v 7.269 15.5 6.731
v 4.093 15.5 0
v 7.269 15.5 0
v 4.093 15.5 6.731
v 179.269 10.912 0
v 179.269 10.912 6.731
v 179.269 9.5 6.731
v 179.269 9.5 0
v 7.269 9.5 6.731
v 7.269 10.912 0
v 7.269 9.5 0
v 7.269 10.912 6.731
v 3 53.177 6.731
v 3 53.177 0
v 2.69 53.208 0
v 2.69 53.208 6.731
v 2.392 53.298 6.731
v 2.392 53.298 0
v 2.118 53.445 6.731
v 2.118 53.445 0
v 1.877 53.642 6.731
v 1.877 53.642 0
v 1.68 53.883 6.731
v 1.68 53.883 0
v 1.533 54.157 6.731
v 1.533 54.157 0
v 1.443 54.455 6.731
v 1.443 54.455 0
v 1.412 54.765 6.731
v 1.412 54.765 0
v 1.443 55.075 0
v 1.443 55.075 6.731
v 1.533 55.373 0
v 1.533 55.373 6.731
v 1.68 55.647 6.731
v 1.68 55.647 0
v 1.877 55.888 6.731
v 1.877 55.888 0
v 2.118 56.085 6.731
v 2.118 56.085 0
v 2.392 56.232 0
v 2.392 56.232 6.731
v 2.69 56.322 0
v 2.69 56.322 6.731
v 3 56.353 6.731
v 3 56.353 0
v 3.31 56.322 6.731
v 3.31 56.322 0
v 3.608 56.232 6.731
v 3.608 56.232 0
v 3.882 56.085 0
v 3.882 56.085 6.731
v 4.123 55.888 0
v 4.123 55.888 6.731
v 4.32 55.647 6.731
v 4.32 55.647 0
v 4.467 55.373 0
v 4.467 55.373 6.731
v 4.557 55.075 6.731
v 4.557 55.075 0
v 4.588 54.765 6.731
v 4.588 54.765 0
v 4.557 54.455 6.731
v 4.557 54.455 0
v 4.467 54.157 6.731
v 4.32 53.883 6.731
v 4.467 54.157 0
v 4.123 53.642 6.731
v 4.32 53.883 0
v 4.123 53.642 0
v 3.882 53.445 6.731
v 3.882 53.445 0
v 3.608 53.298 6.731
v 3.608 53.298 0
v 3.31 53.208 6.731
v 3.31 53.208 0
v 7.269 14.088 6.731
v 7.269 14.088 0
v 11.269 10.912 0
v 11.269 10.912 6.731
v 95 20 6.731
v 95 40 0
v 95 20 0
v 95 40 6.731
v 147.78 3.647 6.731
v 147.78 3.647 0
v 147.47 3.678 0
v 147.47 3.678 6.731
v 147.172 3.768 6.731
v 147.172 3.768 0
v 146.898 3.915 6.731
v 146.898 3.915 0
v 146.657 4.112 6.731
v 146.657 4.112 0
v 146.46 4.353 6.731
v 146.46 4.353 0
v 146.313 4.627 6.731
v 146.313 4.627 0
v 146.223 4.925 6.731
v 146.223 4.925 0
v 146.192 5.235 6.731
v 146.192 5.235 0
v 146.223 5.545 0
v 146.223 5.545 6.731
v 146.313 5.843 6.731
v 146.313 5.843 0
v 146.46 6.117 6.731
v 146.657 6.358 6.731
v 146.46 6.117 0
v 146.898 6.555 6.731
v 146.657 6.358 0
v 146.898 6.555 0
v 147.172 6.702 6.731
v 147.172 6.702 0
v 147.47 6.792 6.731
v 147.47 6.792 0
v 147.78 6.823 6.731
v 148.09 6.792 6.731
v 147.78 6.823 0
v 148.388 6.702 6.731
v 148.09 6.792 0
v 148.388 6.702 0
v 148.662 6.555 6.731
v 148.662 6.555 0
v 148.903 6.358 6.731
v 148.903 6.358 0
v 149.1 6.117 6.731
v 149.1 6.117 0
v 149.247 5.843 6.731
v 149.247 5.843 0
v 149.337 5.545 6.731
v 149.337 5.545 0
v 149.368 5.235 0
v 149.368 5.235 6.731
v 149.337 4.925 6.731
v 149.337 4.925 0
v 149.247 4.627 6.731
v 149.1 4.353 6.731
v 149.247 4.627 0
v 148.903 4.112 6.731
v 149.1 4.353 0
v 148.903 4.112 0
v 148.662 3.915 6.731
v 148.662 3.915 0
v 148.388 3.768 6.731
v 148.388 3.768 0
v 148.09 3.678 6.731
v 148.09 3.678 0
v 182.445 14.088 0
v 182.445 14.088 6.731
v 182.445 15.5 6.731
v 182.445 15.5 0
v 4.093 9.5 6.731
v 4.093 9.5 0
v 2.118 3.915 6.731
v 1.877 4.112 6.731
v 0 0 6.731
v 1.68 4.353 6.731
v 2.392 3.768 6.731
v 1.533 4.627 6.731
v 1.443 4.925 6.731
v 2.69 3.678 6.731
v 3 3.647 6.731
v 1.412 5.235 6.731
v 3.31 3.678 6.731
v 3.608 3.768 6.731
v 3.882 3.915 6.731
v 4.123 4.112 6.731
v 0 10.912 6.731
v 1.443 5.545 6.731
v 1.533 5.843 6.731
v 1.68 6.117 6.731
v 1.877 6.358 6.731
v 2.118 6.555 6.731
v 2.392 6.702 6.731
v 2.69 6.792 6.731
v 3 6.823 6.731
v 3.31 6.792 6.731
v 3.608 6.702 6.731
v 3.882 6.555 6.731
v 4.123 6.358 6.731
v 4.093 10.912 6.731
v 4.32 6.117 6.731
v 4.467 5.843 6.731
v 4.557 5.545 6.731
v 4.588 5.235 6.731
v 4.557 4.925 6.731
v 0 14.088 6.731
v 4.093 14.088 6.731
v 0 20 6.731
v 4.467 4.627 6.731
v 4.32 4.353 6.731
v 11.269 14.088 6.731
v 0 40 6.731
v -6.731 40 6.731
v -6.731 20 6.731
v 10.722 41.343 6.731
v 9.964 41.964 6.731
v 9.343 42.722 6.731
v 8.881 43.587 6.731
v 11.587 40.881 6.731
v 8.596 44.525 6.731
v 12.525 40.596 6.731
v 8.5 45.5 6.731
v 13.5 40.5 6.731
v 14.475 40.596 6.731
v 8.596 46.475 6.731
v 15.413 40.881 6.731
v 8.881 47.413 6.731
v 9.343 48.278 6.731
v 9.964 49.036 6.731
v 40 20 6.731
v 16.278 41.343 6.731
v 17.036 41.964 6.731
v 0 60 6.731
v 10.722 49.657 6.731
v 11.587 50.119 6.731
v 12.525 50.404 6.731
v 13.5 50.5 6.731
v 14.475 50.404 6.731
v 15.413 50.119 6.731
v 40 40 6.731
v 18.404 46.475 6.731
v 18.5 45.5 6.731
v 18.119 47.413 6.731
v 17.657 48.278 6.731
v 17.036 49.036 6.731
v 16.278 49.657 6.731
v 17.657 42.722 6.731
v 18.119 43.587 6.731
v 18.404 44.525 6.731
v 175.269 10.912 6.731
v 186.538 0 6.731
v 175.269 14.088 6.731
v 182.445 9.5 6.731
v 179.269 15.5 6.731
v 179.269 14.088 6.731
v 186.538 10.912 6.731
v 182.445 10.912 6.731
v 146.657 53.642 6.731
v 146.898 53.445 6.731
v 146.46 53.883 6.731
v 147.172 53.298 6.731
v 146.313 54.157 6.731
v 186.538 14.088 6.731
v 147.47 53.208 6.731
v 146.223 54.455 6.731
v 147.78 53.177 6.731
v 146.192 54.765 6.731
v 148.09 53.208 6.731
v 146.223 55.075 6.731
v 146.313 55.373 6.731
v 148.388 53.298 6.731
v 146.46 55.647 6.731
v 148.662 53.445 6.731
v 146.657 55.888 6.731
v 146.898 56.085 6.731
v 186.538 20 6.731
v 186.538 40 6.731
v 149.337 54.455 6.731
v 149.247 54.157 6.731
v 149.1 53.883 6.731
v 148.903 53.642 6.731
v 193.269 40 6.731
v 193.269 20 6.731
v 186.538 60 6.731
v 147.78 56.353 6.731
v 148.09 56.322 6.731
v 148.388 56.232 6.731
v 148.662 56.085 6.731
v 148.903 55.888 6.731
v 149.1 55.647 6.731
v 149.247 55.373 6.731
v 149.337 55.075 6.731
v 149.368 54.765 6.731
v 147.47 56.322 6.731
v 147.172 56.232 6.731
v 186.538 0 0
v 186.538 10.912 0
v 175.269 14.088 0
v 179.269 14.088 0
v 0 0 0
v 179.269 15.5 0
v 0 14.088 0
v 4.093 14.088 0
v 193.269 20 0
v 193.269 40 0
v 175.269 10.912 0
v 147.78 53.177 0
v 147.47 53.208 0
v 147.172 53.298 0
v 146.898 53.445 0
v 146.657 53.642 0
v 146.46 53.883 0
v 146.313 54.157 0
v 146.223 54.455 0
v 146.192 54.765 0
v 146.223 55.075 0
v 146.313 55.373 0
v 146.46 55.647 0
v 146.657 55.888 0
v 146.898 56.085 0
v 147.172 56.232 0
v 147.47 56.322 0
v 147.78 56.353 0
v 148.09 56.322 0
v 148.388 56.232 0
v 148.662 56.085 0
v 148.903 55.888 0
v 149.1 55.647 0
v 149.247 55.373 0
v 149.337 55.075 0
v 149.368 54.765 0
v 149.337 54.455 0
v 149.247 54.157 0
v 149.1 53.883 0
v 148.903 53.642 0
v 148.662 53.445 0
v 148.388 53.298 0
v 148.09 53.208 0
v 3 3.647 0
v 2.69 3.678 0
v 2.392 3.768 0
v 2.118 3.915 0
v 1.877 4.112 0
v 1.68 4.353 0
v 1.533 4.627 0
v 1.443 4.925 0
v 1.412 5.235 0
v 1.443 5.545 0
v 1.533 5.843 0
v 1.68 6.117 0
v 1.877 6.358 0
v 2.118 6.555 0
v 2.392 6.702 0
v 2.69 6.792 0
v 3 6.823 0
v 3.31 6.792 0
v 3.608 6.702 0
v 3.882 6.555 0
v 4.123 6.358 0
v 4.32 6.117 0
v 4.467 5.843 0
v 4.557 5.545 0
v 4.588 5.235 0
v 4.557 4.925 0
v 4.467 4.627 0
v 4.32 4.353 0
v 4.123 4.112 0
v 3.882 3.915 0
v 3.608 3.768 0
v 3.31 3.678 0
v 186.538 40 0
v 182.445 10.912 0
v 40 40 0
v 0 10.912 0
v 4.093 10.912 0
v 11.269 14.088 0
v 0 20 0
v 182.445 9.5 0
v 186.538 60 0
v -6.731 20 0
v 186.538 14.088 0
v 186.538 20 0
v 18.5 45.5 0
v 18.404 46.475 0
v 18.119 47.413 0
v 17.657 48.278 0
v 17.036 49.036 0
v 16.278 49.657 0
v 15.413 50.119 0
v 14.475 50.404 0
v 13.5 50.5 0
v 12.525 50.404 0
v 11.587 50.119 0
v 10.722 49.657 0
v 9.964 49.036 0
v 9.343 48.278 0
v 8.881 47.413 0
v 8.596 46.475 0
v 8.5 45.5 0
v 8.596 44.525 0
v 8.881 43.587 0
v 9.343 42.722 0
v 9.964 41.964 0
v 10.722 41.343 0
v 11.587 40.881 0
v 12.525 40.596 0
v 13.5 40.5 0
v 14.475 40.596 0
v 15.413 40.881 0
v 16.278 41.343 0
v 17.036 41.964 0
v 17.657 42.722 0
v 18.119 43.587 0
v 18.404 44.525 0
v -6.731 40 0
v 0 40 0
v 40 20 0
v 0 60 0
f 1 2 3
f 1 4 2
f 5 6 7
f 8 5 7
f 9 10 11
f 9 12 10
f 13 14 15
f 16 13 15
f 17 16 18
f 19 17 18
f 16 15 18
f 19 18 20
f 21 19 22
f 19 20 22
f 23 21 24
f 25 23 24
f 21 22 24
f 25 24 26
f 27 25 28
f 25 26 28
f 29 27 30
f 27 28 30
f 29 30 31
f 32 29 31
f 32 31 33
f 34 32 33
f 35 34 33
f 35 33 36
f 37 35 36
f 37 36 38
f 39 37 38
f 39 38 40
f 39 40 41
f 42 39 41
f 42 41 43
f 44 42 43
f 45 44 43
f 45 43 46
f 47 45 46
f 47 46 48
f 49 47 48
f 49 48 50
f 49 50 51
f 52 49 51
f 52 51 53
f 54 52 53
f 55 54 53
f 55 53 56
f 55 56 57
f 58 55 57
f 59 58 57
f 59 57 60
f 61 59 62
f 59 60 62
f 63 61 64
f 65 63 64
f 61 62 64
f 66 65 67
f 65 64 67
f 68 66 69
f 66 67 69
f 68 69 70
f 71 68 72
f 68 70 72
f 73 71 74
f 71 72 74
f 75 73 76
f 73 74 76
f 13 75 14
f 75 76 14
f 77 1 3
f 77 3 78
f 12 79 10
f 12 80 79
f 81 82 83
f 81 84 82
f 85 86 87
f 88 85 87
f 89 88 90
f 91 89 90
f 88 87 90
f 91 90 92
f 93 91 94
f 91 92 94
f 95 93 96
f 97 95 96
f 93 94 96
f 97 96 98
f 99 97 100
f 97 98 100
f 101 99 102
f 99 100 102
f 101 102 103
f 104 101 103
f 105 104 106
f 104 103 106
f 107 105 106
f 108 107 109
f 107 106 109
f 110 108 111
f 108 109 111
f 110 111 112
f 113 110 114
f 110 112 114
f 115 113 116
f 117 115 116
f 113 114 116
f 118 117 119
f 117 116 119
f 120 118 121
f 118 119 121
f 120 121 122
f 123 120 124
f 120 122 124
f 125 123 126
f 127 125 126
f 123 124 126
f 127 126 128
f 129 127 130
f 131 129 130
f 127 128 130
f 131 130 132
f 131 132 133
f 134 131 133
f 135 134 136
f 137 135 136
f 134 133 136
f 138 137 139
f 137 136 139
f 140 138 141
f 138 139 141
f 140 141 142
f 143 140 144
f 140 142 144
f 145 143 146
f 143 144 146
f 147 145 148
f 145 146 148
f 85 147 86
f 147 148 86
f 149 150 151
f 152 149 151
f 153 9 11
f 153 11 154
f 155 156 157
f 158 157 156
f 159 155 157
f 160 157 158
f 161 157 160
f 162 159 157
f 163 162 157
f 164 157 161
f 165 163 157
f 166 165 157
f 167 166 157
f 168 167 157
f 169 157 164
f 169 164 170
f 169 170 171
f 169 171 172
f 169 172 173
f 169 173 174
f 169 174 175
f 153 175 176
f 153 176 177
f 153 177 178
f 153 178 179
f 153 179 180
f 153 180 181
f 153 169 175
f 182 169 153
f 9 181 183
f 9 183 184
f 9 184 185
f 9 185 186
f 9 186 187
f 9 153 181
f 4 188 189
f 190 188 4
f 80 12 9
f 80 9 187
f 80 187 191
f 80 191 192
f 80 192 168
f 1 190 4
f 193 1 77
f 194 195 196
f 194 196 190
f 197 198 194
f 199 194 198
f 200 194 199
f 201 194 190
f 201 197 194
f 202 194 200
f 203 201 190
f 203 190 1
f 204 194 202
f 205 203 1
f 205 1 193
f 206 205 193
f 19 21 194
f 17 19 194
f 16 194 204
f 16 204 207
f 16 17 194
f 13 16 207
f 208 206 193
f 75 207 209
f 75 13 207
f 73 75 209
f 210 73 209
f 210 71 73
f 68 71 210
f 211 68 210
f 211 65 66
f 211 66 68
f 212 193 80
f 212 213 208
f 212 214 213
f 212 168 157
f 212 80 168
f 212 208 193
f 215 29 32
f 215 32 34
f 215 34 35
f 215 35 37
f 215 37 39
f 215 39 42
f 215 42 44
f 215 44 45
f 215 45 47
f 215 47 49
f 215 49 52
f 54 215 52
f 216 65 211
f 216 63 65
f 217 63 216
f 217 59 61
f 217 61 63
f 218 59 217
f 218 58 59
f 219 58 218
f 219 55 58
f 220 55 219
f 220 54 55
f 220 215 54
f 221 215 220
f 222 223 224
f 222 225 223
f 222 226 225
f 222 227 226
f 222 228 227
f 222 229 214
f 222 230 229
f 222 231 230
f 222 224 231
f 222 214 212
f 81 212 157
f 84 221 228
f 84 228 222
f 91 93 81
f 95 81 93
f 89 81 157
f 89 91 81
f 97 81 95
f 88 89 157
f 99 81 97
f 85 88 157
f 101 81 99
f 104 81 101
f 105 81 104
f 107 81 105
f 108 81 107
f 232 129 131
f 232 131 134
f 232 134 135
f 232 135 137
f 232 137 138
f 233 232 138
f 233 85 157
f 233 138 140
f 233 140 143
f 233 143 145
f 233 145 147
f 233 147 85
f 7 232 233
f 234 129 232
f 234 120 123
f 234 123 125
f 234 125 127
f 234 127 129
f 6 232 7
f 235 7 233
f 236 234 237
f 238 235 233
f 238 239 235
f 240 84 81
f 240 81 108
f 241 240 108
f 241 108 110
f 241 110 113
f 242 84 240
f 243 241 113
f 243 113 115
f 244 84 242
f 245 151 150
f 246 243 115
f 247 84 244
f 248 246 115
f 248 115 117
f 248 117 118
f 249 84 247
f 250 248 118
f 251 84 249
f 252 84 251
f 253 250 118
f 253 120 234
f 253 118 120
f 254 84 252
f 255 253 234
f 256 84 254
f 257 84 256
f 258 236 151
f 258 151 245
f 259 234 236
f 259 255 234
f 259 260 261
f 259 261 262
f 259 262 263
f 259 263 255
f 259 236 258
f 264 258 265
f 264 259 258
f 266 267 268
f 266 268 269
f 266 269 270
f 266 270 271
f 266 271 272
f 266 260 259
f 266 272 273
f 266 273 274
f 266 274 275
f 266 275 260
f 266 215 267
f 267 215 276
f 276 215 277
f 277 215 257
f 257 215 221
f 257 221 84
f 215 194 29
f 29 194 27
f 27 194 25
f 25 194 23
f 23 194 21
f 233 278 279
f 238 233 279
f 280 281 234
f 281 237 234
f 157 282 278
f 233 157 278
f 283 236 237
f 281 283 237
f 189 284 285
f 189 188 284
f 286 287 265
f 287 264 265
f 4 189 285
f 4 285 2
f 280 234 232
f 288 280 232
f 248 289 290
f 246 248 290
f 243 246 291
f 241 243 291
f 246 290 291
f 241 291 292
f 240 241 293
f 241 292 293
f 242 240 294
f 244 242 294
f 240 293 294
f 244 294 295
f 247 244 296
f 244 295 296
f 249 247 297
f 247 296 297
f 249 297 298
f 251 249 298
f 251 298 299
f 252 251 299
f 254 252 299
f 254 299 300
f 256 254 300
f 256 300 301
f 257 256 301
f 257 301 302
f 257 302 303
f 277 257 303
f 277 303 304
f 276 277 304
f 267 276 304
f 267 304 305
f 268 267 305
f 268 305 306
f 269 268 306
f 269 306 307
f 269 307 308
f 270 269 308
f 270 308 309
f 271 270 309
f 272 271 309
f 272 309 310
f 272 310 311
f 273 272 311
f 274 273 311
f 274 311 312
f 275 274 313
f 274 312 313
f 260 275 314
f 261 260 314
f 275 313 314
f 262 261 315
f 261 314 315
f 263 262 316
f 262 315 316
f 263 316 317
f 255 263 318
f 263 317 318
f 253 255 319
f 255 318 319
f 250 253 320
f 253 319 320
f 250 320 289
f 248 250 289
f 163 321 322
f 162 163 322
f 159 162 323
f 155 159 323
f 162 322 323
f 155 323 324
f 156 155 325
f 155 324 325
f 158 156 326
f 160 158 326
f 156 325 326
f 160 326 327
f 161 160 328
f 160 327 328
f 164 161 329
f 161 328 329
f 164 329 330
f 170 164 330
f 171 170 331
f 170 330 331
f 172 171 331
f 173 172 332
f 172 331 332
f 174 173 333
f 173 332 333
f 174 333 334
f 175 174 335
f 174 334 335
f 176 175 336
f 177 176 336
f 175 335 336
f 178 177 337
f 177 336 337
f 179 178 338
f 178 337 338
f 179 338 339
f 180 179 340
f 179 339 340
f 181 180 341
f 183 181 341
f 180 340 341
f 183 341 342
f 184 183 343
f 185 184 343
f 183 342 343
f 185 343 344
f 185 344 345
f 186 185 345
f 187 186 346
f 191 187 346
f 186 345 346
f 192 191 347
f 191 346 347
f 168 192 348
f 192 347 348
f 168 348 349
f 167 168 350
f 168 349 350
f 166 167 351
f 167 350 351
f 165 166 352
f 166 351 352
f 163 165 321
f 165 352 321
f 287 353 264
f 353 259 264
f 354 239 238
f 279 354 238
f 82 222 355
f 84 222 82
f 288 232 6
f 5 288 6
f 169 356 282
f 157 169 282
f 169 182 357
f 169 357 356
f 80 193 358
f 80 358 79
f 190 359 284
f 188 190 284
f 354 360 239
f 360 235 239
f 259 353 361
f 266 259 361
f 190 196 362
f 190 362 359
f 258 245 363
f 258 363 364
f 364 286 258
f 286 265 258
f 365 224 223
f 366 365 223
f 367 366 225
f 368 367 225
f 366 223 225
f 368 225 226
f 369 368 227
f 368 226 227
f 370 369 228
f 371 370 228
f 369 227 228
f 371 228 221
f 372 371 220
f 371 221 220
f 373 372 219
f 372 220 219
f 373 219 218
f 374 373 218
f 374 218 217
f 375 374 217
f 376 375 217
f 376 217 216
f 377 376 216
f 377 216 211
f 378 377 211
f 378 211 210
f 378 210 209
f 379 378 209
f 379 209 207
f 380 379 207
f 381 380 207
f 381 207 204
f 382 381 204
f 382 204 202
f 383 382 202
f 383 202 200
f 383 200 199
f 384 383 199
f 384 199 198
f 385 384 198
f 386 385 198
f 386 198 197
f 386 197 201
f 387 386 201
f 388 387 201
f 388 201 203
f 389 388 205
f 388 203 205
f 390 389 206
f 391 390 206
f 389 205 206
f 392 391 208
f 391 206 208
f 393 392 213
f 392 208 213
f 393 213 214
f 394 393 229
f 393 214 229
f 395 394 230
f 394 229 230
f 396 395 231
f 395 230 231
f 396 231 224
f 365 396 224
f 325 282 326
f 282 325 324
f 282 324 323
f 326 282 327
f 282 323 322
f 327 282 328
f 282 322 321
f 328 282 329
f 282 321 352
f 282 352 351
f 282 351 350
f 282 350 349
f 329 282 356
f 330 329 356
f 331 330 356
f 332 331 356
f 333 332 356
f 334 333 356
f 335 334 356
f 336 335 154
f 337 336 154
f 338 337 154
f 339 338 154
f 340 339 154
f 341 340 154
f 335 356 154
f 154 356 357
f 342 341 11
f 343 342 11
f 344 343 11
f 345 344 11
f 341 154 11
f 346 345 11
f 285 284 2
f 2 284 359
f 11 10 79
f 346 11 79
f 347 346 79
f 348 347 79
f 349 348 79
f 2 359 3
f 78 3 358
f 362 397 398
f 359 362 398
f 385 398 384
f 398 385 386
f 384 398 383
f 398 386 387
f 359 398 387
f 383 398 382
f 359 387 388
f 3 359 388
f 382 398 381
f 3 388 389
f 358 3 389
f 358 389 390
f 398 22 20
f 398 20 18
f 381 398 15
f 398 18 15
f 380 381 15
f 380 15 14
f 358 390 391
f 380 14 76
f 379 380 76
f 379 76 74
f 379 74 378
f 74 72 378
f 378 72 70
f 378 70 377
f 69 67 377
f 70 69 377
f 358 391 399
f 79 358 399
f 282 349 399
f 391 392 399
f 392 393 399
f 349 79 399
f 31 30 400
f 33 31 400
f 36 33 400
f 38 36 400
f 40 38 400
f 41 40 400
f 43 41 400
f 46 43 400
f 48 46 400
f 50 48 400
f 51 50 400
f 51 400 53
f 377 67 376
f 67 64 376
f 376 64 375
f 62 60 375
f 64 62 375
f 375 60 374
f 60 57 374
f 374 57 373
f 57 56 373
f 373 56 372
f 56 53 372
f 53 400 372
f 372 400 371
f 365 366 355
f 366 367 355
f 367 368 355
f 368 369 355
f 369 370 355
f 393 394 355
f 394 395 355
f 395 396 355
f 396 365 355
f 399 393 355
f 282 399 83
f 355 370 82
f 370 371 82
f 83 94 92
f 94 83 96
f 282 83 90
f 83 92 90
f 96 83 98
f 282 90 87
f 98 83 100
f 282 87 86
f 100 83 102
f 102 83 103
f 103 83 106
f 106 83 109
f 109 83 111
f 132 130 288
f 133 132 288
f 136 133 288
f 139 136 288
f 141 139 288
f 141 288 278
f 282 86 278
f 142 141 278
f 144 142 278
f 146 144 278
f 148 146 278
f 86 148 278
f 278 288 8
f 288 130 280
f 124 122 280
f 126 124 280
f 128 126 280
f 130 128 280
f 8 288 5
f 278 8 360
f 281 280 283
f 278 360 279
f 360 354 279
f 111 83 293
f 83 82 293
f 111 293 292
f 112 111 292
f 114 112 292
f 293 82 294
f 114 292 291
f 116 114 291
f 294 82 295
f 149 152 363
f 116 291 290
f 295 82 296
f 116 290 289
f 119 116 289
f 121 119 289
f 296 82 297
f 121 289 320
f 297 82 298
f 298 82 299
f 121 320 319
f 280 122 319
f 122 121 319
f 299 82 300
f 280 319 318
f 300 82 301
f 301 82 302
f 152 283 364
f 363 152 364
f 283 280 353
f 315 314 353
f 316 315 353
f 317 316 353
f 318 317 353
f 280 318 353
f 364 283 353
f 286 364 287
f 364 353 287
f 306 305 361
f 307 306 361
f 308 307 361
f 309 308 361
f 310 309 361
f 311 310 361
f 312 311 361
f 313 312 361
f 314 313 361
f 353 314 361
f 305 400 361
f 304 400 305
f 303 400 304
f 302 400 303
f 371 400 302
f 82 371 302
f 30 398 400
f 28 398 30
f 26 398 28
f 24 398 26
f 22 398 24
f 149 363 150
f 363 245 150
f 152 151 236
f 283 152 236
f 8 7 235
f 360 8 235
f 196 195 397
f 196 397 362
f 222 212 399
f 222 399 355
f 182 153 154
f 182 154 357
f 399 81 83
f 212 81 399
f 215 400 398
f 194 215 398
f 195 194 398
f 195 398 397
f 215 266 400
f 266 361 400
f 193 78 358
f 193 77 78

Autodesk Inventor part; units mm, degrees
ref_plane "YZ Plane" through (0, 0, 0) normal (1, 0, 0) x (0, 1, 0)
ref_plane "XZ Plane" through (0, 0, 0) normal (0, 1, 0) x (-1, 0, 0)
ref_plane "XY Plane" through (0, 0, 0) normal (0, 0, 1) x (1, 0, 0)
sketch "Sketch1" plane through (0, 0, 0) normal (0, 0, 1) x (1, 0, 0)
  line L0 (0, 0) -> (186.538, 0)
  line L1 (186.538, 0) -> (186.538, 60)
  line L2 (186.538, 60) -> (0, 60)
  line L3 (0, 60) -> (0, 0)
  dimension "d0" = 186.538
  dimension "d1" = 60
extrude "Extrusion1" add sketch "Sketch1" along normal blind 6.731
sketch "Sketch2" plane through (0, 0, 6.731) normal (0, 0, 1) x (1, 0, 0)
  line L0 (186.538, 0) -> (186.538, 60) projected
  line L1 (0, 60) -> (0, 0) projected
  line L2 (186.538, 40) -> (193.269, 40)
  line L3 (193.269, 40) -> (193.269, 20)
  line L4 (193.269, 20) -> (186.538, 20)
  line L5 (186.538, 20) -> (186.538, 40)
  line L6 (0, 40) -> (-6.731, 40)
  line L7 (-6.731, 40) -> (-6.731, 20)
  line L8 (-6.731, 20) -> (0, 20)
  line L9 (0, 20) -> (0, 40)
  point P0 (0, 30)
  point P1 (0, 30)
  dimension "d4" = 20
  dimension "d5" = 6.731
extrude "Tabs" add sketch "Sketch2" against normal blind 6.731
sketch "Sketch5" plane through (0, 0, 6.731) normal (0, 0, 1) x (1, 0, 0)
  line L0 (193.269, 40) -> (186.538, 40) projected
  line L1 (0, 40) -> (-6.731, 40) projected
  line L2 (-6.731, 40) -> (-6.731, 20) projected
  point P0 (-3.3655, 30)
  point P1 (189.9035, 30)
  point P2 (-6.731, 30)
  point P3 (-6.731, 30)
  point P4 (189.9035, 40)
  point P5 (-3.3655, 40)
hole "TabHole" [suppressed]
sketch "Sketch3" plane through (0, 0, 6.731) normal (0, 0, 1) x (1, 0, 0)
  line L0 (0, 60) -> (0, 40) projected
  line L1 (-6.731, 40) -> (-6.731, 20) projected
  line L2 (40, 40) -> (95, 40)
  line L3 (95, 40) -> (95, 20)
  line L4 (95, 20) -> (40, 20)
  line L5 (40, 20) -> (40, 40)
  point P0 (40, 30)
  point P1 (-6.731, 30)
  dimension "d8" = 55
  dimension "d9" = 20
  dimension "d10" = 40
extrude "RibbonHole" cut sketch "Sketch3" against normal up to next
sketch "Sketch4" plane through (0, 0, 6.731) normal (0, 0, 1) x (1, 0, 0)
  line L0 (40, 20) -> (40, 40) projected
  line L1 (0, 60) -> (0, 40) projected
  line L2 (0, 20) -> (0, 0) projected
  line L3 (3, 5.235) -> (3, 54.765) construction
  line L4 (3, 54.765) -> (147.78, 54.765) construction
  point P0 (3, 30)
  point P1 (40, 30)
  point P2 (147.78, 5.235)
  dimension "d13" = 144.78
  dimension "d14" = 49.53
  dimension "d16" = 3
hole "LCDMount" at (3, 54.765, 6.731) at (147.78, 54.765, 6.731) at (147.78, 5.235, 6.731) at (3, 5.235, 6.731) direction (0, 0, -1) diameter 3.176 end through all
sketch "Sketch6" plane through (0, 0, 6.731) normal (0, 0, 1) x (1, 0, 0)
  line L0 (186.538, 60) -> (0, 60) projected
  line L1 (0, 60) -> (0, 40) projected
  circle A0 centre (13.5, 45.5) radius 5
  dimension "d31" = 14.5
  dimension "d32" = 13.5
  dimension "d33" = 10
extrude "PotHole" cut sketch "Sketch6" against normal up to next
sketch "Sketch7" plane through (0, 0, 6.731) normal (0, 0, 1) x (1, 0, 0)
  line L0 (-6.731, 20) -> (0, 20) projected
  line L1 (0, 20) -> (0, 0) projected
  line L2 (0, 14.088) -> (4.093, 14.088)
  line L3 (4.093, 14.088) -> (4.093, 15.5)
  line L4 (4.093, 15.5) -> (7.269, 15.5)
  line L5 (7.269, 15.5) -> (7.269, 14.088)
  line L6 (7.269, 14.088) -> (11.269, 14.088)
  line L7 (11.269, 14.088) -> (11.269, 10.912)
  line L8 (11.269, 10.912) -> (7.269, 10.912)
  line L9 (7.269, 10.912) -> (7.269, 9.5)
  line L10 (7.269, 9.5) -> (4.093, 9.5)
  line L11 (4.093, 9.5) -> (4.093, 10.912)
  line L12 (4.093, 10.912) -> (0, 10.912)
  line L13 (186.538, 0) -> (186.538, 20) projected
  line L14 (-6.731, 40) -> (-6.731, 20) projected
  line L15 (186.538, 14.088) -> (182.445, 14.088)
  line L16 (182.445, 14.088) -> (182.445, 15.5)
  line L17 (182.445, 15.5) -> (179.269, 15.5)
  line L18 (179.269, 15.5) -> (179.269, 14.088)
  line L19 (179.269, 14.088) -> (175.269, 14.088)
  line L20 (175.269, 14.088) -> (175.269, 10.912)
  line L21 (175.269, 10.912) -> (179.269, 10.912)
  line L22 (179.269, 10.912) -> (179.269, 9.5)
  line L23 (179.269, 9.5) -> (182.445, 9.5)
  line L24 (182.445, 9.5) -> (182.445, 10.912)
  line L25 (182.445, 10.912) -> (186.538, 10.912)
  point P0 (11.269, 12.5)
  dimension "d36" = 3.176
  dimension "d38" = 11.269
  dimension "d39" = 4
  dimension "d40" = 6
  dimension "d43" = 7.5
extrude "Nut" cut sketch "Sketch7" against normal up to next
equation "\"d2\" = THICKB"
equation "\"d5\" = THICKB"
equation "\"d6\" = THICKB"
equation "\"THICKA\" = 3.175"
equation "\"THICKB\" = 6.731"
equation "\"THICKC\" = 12.7"
equation "\"THICKPLY\" = 5"
equation "\"MAGDIA\" = 9.5"
equation "\"BALLDIA\" = 12"
properties part number "Controller_Front"
